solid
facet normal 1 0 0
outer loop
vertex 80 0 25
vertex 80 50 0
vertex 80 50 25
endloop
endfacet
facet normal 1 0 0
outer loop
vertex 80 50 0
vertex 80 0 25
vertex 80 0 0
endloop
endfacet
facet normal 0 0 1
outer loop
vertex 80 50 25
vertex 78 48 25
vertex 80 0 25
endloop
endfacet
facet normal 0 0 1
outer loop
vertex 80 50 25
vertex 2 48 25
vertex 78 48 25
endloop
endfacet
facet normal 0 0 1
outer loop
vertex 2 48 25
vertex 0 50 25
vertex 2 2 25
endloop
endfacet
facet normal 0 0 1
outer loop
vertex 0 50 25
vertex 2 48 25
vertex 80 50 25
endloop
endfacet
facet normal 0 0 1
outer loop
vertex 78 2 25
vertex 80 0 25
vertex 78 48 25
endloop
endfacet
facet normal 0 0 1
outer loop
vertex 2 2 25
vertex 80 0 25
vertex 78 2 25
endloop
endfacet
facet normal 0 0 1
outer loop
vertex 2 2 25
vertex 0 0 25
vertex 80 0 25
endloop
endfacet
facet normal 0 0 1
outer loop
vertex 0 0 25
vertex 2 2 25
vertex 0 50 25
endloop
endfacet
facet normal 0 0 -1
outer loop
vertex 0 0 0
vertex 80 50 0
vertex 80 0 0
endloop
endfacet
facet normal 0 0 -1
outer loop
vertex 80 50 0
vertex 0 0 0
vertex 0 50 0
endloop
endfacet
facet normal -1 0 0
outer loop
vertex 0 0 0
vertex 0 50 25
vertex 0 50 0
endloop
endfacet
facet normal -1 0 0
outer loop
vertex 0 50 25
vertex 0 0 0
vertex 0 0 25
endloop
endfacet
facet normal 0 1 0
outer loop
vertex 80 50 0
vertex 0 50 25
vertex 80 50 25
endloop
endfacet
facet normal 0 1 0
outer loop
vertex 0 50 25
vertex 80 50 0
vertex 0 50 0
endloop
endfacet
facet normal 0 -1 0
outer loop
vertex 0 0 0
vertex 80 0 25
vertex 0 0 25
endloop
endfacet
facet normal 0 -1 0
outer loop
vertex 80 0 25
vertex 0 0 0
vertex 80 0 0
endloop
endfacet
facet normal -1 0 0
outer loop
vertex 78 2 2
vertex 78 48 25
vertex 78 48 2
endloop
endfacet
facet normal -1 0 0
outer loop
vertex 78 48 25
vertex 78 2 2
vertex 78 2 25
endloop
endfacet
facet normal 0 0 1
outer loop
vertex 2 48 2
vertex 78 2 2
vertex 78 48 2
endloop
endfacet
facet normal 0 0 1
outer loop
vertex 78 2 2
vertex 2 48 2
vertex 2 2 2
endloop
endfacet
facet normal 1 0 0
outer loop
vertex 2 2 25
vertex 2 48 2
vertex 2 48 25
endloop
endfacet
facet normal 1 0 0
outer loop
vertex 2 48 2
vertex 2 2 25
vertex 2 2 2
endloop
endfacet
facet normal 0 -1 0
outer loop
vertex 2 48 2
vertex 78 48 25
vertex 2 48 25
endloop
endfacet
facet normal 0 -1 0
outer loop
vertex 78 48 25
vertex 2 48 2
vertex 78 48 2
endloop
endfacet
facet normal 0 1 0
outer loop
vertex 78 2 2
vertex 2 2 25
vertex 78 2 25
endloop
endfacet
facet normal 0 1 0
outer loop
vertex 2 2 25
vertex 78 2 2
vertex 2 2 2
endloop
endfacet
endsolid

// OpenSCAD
// Millimeters. Geometry only, engineer before fabrication.
difference() { cube([80,50,25]); translate([2,2,2]) cube([76,46,25]); }
